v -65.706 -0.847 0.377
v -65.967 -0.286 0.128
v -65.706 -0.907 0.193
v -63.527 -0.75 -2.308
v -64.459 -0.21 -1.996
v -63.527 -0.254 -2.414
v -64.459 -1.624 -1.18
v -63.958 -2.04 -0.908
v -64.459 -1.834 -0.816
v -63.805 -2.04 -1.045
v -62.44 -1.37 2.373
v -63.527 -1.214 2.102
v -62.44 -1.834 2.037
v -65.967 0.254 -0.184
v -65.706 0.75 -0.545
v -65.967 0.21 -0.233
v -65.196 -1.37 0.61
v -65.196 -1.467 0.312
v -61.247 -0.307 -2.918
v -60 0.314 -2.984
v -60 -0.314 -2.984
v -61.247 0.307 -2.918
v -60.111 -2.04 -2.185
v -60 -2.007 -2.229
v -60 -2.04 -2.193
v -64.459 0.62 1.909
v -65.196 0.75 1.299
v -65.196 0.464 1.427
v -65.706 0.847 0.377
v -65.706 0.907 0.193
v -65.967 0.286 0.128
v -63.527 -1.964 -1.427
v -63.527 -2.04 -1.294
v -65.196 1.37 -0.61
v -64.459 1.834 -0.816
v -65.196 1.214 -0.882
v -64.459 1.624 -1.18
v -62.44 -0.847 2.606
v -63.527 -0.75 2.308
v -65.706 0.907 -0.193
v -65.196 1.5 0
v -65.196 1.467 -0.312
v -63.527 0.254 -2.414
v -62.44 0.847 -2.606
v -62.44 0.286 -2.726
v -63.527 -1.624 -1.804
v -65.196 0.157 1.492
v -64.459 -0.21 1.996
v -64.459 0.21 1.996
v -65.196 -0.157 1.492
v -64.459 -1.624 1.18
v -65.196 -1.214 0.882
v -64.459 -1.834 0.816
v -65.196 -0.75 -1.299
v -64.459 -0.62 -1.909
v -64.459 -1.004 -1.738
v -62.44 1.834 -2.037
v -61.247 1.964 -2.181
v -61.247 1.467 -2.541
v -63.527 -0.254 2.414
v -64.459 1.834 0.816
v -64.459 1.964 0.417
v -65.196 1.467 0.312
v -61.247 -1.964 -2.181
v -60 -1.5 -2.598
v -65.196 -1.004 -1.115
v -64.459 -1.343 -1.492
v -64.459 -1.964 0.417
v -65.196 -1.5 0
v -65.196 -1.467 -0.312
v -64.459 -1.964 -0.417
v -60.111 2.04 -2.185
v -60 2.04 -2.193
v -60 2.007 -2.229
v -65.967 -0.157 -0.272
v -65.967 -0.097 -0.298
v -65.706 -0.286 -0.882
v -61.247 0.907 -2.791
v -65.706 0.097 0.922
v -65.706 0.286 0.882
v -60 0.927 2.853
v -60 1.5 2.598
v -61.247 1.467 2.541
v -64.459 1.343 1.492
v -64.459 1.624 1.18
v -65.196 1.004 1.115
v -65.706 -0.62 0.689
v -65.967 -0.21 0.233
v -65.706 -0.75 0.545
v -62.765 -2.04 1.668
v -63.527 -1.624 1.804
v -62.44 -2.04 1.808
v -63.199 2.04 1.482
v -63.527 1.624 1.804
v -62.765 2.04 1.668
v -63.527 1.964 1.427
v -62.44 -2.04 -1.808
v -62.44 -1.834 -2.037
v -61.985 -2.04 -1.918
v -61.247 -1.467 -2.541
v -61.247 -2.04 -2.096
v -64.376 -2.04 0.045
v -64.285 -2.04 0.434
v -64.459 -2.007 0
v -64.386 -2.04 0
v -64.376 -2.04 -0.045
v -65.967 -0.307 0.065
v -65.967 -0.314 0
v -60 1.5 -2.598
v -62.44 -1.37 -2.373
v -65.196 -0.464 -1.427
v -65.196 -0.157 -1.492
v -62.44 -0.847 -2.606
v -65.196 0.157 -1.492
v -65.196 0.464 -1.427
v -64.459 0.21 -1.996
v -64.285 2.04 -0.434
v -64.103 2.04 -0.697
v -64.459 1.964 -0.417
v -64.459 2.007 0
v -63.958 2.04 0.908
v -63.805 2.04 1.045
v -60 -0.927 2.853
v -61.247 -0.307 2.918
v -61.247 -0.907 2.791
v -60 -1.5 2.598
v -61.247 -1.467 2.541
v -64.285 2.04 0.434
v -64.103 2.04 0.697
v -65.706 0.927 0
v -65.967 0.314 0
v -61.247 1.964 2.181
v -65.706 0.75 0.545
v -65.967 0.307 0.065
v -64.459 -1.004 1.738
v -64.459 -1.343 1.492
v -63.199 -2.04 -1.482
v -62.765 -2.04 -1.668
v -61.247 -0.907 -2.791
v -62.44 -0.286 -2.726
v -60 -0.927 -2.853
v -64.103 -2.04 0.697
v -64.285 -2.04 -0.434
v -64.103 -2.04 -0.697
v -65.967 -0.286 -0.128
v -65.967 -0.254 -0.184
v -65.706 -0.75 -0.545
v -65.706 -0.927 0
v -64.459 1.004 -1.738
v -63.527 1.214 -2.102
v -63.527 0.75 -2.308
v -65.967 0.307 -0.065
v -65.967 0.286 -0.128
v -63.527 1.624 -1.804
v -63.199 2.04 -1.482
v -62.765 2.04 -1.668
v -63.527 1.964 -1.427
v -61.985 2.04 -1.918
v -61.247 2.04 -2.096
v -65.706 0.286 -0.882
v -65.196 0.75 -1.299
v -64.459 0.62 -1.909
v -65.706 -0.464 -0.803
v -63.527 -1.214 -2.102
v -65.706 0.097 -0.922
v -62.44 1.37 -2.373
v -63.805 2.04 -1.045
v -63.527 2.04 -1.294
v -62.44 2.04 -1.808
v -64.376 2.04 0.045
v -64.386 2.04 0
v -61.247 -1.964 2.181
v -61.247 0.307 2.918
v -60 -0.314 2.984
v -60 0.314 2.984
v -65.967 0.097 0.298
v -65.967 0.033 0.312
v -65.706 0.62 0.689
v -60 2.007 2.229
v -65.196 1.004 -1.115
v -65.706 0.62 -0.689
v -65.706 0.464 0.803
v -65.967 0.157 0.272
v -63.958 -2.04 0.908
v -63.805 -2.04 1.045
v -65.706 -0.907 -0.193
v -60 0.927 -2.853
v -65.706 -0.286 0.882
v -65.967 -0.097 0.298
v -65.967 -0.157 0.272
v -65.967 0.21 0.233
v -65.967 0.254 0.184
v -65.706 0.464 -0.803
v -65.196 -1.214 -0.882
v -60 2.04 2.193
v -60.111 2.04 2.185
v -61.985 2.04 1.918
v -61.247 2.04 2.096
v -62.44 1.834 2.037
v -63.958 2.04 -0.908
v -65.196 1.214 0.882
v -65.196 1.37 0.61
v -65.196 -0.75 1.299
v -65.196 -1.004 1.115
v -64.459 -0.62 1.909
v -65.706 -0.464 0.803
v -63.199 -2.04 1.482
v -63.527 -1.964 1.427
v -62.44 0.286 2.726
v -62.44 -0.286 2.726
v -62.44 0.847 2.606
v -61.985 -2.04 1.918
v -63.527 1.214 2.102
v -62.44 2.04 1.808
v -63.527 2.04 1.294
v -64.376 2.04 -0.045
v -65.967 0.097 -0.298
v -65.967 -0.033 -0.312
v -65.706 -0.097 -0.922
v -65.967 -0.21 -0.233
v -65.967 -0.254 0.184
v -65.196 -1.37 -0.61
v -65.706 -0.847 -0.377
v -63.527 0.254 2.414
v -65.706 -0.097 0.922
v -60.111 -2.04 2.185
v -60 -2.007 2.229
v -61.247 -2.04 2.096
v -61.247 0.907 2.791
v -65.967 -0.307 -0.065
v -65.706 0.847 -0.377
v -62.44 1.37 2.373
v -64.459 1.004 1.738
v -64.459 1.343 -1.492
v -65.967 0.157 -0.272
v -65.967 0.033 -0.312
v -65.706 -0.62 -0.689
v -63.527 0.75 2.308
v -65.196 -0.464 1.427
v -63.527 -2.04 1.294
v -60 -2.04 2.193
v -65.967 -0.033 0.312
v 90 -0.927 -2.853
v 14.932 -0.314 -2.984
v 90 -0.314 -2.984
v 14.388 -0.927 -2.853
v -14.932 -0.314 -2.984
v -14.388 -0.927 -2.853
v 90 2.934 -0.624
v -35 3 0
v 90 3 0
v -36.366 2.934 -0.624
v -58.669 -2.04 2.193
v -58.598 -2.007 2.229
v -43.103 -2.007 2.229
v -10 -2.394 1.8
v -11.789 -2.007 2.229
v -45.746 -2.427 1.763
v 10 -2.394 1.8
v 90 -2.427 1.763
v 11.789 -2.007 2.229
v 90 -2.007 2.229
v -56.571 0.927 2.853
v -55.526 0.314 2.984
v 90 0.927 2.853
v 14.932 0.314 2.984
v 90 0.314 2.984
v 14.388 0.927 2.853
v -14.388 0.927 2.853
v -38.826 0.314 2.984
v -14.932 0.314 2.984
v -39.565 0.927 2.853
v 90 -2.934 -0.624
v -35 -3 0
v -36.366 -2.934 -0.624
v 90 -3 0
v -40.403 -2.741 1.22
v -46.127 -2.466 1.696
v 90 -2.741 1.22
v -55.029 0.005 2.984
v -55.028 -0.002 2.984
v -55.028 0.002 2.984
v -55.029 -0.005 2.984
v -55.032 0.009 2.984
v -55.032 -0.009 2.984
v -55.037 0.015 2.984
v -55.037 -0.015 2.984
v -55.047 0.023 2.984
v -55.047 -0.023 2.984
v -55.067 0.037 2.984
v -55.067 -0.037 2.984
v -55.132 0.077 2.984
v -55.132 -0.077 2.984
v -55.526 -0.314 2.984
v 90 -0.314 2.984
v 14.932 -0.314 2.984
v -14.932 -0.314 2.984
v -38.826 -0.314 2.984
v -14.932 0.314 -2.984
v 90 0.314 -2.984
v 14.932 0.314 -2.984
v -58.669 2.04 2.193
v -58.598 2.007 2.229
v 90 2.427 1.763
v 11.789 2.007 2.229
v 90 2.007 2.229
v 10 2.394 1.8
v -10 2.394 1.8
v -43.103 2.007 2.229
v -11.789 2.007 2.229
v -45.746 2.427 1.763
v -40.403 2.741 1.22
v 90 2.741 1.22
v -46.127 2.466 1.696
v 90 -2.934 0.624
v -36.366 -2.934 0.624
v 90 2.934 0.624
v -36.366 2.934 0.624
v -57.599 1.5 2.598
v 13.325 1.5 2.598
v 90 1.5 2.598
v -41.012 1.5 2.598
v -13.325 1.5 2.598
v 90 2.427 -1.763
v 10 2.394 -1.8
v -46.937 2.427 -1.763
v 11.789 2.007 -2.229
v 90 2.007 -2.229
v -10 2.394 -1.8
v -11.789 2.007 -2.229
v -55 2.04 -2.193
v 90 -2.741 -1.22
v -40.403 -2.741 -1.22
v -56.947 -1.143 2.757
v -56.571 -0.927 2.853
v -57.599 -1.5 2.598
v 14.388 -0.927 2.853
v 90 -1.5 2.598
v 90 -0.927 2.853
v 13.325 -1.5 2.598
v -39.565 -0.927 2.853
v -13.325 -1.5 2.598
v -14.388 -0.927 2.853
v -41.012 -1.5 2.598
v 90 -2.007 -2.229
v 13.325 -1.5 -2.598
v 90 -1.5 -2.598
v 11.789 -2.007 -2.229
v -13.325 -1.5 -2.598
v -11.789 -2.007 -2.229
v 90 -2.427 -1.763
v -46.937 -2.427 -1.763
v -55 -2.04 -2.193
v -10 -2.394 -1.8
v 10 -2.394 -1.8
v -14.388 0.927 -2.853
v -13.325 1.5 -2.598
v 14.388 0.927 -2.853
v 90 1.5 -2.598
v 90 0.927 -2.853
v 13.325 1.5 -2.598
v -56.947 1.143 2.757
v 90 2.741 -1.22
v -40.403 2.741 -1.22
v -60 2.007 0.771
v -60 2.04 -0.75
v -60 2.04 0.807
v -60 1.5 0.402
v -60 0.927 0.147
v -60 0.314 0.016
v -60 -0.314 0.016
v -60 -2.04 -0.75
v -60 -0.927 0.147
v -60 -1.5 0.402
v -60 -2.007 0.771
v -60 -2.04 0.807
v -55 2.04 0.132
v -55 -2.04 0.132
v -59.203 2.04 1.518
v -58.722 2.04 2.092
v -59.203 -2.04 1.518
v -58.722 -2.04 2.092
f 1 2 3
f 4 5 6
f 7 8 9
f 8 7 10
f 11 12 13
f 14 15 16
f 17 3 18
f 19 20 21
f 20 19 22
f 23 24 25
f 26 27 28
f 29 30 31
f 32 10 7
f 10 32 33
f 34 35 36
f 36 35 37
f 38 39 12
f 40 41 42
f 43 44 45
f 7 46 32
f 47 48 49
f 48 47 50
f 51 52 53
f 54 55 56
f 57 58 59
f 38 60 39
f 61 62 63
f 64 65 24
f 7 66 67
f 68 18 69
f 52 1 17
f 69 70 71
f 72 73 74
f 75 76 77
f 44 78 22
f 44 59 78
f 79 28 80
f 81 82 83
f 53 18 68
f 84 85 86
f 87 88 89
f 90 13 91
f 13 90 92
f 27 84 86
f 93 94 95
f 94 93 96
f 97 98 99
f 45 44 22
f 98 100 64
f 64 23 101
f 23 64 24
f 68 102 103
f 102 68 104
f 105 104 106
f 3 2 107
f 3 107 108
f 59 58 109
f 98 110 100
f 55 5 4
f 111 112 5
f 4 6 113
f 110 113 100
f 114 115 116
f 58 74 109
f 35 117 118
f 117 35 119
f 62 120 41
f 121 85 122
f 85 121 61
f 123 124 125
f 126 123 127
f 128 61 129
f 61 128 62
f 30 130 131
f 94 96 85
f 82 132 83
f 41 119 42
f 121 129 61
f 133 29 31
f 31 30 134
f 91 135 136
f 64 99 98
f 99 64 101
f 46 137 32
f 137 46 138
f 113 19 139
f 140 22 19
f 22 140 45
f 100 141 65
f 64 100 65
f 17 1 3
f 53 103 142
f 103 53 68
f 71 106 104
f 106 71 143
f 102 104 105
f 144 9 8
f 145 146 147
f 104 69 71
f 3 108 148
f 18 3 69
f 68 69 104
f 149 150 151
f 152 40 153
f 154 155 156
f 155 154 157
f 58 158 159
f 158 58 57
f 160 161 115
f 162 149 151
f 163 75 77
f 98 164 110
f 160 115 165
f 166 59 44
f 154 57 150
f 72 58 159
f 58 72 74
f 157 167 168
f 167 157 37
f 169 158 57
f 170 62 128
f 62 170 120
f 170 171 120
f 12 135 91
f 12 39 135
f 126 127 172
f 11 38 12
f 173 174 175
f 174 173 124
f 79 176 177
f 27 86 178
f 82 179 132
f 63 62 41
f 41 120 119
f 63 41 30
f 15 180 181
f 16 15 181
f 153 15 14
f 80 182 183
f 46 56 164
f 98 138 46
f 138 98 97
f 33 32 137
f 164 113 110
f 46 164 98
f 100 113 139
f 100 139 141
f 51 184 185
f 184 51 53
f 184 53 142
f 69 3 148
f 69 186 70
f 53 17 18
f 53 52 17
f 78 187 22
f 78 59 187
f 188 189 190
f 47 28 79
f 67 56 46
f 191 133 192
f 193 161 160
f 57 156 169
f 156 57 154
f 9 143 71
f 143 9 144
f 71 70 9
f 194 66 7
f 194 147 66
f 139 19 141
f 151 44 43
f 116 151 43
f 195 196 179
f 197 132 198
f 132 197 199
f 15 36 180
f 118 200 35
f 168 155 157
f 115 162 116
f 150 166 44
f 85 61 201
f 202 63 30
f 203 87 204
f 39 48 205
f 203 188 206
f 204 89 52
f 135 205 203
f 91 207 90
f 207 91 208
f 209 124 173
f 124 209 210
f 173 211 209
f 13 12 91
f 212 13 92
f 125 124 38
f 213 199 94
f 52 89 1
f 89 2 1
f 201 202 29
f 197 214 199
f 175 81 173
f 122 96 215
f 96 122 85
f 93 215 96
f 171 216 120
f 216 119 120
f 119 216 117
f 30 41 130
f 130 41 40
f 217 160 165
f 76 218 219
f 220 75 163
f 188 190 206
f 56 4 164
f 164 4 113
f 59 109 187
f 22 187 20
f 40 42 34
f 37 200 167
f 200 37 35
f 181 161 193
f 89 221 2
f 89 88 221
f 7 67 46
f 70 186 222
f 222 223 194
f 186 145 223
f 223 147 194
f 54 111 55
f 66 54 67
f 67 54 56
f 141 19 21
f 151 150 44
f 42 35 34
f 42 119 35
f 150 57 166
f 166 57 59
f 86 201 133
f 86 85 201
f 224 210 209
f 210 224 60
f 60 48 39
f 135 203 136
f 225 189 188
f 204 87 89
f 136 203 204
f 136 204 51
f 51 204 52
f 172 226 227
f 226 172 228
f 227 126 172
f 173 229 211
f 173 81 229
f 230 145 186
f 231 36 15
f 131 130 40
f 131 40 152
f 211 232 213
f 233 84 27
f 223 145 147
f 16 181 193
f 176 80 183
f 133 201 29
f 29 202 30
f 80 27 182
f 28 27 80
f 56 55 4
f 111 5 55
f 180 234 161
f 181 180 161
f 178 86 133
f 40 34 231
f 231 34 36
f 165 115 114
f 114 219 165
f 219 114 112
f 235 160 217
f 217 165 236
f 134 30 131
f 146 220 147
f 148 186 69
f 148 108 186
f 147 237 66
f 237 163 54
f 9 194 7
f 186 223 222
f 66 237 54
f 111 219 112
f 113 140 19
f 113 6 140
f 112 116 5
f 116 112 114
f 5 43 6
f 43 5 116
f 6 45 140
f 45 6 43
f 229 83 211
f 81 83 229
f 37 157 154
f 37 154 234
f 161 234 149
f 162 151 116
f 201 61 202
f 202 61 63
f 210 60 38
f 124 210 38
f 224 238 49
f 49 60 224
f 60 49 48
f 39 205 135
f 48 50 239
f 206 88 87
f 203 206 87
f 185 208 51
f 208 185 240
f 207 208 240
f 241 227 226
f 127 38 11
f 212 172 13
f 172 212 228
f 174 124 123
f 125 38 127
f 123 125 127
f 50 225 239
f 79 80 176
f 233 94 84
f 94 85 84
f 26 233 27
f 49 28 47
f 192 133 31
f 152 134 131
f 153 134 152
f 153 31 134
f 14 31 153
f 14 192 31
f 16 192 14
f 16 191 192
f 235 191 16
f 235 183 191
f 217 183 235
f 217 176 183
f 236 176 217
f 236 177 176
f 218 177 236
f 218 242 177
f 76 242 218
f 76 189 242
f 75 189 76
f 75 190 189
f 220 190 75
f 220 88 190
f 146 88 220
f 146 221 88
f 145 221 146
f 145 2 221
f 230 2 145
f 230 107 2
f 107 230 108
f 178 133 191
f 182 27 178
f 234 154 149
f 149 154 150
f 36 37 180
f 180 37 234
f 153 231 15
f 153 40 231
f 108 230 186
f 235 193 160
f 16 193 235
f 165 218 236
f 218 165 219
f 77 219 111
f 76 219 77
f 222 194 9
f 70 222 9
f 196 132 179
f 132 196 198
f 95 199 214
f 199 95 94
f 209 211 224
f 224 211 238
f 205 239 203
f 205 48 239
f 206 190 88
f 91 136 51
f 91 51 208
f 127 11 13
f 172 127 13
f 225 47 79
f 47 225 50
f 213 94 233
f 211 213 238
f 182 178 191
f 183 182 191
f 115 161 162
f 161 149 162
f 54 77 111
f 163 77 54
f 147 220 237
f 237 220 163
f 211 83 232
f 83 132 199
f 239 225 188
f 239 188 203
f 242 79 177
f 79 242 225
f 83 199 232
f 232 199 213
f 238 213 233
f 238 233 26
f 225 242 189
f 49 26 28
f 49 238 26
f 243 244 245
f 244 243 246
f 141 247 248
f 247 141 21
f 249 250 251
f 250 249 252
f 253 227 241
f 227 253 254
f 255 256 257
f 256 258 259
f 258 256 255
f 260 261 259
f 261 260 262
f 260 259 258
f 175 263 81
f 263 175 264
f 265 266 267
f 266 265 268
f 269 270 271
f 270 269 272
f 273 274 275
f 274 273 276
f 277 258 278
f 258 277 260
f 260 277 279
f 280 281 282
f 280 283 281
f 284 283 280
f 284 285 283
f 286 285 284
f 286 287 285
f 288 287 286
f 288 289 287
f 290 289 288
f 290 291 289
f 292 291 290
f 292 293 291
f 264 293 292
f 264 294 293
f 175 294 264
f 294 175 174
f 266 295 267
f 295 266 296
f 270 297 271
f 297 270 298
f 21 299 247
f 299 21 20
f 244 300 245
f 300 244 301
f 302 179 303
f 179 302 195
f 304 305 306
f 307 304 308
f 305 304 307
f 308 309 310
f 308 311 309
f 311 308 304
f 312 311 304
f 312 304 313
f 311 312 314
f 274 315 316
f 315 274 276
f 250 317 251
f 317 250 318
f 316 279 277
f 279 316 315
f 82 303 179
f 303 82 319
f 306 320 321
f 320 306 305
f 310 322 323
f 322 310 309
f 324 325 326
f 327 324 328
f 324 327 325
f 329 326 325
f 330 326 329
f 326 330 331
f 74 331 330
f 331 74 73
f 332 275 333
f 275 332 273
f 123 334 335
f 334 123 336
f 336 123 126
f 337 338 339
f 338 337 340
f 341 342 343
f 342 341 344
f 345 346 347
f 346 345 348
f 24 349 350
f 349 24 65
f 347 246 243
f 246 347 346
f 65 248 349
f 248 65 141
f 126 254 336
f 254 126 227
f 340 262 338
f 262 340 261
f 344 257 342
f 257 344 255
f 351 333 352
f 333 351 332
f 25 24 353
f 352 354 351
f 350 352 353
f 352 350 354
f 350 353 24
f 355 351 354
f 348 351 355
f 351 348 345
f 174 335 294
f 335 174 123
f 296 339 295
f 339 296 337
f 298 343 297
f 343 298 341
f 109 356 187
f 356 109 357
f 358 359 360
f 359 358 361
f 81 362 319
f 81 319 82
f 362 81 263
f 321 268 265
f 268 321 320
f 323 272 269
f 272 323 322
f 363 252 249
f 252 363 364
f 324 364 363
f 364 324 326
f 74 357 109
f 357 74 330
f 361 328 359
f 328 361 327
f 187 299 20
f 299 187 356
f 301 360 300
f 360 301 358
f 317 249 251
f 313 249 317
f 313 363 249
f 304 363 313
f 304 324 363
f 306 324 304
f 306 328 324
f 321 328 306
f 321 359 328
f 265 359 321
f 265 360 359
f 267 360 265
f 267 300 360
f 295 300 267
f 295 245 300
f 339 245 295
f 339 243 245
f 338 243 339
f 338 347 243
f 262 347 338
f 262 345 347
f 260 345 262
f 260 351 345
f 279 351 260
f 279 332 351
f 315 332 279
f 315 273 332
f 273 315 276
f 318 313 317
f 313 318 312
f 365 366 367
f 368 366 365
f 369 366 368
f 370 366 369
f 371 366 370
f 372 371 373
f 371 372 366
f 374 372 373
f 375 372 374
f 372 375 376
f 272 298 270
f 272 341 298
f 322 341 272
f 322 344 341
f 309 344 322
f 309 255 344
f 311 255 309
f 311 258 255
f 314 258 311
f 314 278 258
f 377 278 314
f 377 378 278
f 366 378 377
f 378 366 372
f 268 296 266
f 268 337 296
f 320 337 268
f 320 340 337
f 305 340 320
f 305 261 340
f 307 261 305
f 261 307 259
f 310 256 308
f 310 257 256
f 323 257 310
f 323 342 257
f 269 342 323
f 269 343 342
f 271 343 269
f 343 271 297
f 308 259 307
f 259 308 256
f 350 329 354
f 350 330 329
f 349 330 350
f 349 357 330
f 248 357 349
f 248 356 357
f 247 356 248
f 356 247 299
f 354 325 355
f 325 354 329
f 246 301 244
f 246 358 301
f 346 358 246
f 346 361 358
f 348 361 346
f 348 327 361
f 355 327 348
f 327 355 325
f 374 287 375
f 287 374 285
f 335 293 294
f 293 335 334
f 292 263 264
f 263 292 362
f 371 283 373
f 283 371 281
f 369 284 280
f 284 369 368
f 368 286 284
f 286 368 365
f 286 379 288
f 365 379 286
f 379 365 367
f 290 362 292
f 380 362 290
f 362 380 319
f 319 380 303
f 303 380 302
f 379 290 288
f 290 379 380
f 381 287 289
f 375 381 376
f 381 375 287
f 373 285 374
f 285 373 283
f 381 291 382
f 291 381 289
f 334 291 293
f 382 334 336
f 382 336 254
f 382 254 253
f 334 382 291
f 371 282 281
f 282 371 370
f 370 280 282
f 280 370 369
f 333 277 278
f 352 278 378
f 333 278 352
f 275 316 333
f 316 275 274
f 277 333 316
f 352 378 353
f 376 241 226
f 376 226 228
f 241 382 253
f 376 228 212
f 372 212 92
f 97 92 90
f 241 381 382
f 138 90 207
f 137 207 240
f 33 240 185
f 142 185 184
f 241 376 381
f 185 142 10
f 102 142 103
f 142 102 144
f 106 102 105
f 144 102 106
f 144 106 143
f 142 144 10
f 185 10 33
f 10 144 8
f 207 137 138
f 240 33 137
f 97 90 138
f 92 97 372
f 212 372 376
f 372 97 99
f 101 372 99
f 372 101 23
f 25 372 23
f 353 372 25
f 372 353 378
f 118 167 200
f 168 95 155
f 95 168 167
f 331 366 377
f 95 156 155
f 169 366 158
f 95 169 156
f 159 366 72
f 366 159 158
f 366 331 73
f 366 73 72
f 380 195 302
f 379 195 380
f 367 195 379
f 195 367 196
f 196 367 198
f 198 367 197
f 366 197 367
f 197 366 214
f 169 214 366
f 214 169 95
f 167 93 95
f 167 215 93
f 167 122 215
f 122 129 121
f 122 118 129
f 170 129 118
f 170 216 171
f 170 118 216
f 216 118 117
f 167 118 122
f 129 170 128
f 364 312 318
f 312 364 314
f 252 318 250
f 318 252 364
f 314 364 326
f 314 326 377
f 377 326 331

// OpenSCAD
/* [Overall size] */
// The diameter of the hook in mm - see http://www.karpstyles.com/crochet/hook-chart.html for US and UK sizes
diameter = 6;
d = diameter;
r = diameter/2;
length = 150; // [30:300]
/* [Hook and throat] */
// How sharply the throat slopes down from the shaft (in degrees)
throat_angle = 10;
hook_lower_angle = 90 - throat_angle;
// The length of the pointy curled-over bit
hook_length = 5;
// How long the narrowed section at the point is
narrowing_length = 10;
// How long the sloping section from shaft to narrowing is
narrowing_slope = 20;
// How much the throat narrows on each side, as a fraction of the diameter
narrowing_ratio = 0.16;
narrowing_depth = d * narrowing_ratio;
/* [Thumb rest] */
// The length of the thumb rest
grip_length = 20;
// How long the sloping sections from shaft and handle to thumb rest are
grip_slope=5;
// How thick the thumb rest is, as a fraction of the diameter
grip_thickness = 0.6;
grip_depth=d * (1 - grip_thickness)/2;
// Distance from the centre-point of the thumb rest to the tip of the point
length_above_grip = 60;
// measured from the centre-point of the thumb rest to the end of the handle
length_below_grip = length - length_above_grip;
/* [Hidden] */
hook_upper_angle = 0;

$fn = 30;

// Right-angled triangle with interior angle <angle>.
module triangle(radius, angle)
{
  o=radius*sin(angle);
  a=radius*cos(angle);
  polygon(points=[[0,0], [a,0], [a,o]]);
}

// module triangle_prism() copied from:
// https://github.com/elmom/MCAD/blob/master/regular_shapes.scad
module triangle_prism(height, radius, angle)
{
  linear_extrude(height=height, center = true) triangle(radius, angle);
}

module trapezium_prism(trap_height, flat_width, slope_width, height)
{
  max_x = slope_width + flat_width/2;
  linear_extrude(height=height, center=true)
    polygon(points=[[-max_x, 0],
                    [-flat_width/2, trap_height],
                    [flat_width/2, trap_height],
                    [max_x, 0]]);
}

module grip_side()
{
	trapezium_prism(grip_depth, grip_length, grip_slope, d);
}

module grip()
{
        translate([0, r, 0])
                rotate(a=[0, 90, 180])
                        grip_side();
        translate([0, -r, 0])
                rotate(a=[0, 90, 0])
                        grip_side();
}

module narrowing_side()
{
	trapezium_prism(narrowing_depth, narrowing_length, narrowing_slope, d);
}

module narrowing()
{
        translate(v=[r, 0, length_above_grip])
                rotate(a=[-90, 90, 0])
                        narrowing_side();
        translate(v=[-r, 0, length_above_grip])
                rotate(a=[-90, 90, 180])
                        narrowing_side();
}

module outer_shell()
{
        union()
        {
                translate (v=[0, 0, length_above_grip])
                        scale([1.0, 1.0, 2.0])
                        sphere(r = r, anglesteps = 10, sweepsteps = 10);
                translate (v=[0, 0, -length_below_grip])
                        cylinder(r = r, h = length);
        }
}

module throat()
{
        translate (v= [0 , -r/4, length_above_grip])
                rotate(a=[270, 0, 90])
                difference() {
                        triangle_prism(d, 4*d, hook_lower_angle);
                        triangle_prism(d, 4*d, hook_upper_angle);
                }
}

module hook()
{
        intersection() {
                outer_shell();
                translate(v=[0, r, length_above_grip - hook_length])
                        cylinder(h=hook_length, r1=0, r2=r, center=false);
        }
}

rotate(a=[90, 0, 270]) {
        difference() {
                union() {
                        difference()
                        {
                                outer_shell();
                                throat();
                                grip();
                        }
                        hook();
                }
		// Narrow the head, for Greater Pointiness
                narrowing();
        }
}
